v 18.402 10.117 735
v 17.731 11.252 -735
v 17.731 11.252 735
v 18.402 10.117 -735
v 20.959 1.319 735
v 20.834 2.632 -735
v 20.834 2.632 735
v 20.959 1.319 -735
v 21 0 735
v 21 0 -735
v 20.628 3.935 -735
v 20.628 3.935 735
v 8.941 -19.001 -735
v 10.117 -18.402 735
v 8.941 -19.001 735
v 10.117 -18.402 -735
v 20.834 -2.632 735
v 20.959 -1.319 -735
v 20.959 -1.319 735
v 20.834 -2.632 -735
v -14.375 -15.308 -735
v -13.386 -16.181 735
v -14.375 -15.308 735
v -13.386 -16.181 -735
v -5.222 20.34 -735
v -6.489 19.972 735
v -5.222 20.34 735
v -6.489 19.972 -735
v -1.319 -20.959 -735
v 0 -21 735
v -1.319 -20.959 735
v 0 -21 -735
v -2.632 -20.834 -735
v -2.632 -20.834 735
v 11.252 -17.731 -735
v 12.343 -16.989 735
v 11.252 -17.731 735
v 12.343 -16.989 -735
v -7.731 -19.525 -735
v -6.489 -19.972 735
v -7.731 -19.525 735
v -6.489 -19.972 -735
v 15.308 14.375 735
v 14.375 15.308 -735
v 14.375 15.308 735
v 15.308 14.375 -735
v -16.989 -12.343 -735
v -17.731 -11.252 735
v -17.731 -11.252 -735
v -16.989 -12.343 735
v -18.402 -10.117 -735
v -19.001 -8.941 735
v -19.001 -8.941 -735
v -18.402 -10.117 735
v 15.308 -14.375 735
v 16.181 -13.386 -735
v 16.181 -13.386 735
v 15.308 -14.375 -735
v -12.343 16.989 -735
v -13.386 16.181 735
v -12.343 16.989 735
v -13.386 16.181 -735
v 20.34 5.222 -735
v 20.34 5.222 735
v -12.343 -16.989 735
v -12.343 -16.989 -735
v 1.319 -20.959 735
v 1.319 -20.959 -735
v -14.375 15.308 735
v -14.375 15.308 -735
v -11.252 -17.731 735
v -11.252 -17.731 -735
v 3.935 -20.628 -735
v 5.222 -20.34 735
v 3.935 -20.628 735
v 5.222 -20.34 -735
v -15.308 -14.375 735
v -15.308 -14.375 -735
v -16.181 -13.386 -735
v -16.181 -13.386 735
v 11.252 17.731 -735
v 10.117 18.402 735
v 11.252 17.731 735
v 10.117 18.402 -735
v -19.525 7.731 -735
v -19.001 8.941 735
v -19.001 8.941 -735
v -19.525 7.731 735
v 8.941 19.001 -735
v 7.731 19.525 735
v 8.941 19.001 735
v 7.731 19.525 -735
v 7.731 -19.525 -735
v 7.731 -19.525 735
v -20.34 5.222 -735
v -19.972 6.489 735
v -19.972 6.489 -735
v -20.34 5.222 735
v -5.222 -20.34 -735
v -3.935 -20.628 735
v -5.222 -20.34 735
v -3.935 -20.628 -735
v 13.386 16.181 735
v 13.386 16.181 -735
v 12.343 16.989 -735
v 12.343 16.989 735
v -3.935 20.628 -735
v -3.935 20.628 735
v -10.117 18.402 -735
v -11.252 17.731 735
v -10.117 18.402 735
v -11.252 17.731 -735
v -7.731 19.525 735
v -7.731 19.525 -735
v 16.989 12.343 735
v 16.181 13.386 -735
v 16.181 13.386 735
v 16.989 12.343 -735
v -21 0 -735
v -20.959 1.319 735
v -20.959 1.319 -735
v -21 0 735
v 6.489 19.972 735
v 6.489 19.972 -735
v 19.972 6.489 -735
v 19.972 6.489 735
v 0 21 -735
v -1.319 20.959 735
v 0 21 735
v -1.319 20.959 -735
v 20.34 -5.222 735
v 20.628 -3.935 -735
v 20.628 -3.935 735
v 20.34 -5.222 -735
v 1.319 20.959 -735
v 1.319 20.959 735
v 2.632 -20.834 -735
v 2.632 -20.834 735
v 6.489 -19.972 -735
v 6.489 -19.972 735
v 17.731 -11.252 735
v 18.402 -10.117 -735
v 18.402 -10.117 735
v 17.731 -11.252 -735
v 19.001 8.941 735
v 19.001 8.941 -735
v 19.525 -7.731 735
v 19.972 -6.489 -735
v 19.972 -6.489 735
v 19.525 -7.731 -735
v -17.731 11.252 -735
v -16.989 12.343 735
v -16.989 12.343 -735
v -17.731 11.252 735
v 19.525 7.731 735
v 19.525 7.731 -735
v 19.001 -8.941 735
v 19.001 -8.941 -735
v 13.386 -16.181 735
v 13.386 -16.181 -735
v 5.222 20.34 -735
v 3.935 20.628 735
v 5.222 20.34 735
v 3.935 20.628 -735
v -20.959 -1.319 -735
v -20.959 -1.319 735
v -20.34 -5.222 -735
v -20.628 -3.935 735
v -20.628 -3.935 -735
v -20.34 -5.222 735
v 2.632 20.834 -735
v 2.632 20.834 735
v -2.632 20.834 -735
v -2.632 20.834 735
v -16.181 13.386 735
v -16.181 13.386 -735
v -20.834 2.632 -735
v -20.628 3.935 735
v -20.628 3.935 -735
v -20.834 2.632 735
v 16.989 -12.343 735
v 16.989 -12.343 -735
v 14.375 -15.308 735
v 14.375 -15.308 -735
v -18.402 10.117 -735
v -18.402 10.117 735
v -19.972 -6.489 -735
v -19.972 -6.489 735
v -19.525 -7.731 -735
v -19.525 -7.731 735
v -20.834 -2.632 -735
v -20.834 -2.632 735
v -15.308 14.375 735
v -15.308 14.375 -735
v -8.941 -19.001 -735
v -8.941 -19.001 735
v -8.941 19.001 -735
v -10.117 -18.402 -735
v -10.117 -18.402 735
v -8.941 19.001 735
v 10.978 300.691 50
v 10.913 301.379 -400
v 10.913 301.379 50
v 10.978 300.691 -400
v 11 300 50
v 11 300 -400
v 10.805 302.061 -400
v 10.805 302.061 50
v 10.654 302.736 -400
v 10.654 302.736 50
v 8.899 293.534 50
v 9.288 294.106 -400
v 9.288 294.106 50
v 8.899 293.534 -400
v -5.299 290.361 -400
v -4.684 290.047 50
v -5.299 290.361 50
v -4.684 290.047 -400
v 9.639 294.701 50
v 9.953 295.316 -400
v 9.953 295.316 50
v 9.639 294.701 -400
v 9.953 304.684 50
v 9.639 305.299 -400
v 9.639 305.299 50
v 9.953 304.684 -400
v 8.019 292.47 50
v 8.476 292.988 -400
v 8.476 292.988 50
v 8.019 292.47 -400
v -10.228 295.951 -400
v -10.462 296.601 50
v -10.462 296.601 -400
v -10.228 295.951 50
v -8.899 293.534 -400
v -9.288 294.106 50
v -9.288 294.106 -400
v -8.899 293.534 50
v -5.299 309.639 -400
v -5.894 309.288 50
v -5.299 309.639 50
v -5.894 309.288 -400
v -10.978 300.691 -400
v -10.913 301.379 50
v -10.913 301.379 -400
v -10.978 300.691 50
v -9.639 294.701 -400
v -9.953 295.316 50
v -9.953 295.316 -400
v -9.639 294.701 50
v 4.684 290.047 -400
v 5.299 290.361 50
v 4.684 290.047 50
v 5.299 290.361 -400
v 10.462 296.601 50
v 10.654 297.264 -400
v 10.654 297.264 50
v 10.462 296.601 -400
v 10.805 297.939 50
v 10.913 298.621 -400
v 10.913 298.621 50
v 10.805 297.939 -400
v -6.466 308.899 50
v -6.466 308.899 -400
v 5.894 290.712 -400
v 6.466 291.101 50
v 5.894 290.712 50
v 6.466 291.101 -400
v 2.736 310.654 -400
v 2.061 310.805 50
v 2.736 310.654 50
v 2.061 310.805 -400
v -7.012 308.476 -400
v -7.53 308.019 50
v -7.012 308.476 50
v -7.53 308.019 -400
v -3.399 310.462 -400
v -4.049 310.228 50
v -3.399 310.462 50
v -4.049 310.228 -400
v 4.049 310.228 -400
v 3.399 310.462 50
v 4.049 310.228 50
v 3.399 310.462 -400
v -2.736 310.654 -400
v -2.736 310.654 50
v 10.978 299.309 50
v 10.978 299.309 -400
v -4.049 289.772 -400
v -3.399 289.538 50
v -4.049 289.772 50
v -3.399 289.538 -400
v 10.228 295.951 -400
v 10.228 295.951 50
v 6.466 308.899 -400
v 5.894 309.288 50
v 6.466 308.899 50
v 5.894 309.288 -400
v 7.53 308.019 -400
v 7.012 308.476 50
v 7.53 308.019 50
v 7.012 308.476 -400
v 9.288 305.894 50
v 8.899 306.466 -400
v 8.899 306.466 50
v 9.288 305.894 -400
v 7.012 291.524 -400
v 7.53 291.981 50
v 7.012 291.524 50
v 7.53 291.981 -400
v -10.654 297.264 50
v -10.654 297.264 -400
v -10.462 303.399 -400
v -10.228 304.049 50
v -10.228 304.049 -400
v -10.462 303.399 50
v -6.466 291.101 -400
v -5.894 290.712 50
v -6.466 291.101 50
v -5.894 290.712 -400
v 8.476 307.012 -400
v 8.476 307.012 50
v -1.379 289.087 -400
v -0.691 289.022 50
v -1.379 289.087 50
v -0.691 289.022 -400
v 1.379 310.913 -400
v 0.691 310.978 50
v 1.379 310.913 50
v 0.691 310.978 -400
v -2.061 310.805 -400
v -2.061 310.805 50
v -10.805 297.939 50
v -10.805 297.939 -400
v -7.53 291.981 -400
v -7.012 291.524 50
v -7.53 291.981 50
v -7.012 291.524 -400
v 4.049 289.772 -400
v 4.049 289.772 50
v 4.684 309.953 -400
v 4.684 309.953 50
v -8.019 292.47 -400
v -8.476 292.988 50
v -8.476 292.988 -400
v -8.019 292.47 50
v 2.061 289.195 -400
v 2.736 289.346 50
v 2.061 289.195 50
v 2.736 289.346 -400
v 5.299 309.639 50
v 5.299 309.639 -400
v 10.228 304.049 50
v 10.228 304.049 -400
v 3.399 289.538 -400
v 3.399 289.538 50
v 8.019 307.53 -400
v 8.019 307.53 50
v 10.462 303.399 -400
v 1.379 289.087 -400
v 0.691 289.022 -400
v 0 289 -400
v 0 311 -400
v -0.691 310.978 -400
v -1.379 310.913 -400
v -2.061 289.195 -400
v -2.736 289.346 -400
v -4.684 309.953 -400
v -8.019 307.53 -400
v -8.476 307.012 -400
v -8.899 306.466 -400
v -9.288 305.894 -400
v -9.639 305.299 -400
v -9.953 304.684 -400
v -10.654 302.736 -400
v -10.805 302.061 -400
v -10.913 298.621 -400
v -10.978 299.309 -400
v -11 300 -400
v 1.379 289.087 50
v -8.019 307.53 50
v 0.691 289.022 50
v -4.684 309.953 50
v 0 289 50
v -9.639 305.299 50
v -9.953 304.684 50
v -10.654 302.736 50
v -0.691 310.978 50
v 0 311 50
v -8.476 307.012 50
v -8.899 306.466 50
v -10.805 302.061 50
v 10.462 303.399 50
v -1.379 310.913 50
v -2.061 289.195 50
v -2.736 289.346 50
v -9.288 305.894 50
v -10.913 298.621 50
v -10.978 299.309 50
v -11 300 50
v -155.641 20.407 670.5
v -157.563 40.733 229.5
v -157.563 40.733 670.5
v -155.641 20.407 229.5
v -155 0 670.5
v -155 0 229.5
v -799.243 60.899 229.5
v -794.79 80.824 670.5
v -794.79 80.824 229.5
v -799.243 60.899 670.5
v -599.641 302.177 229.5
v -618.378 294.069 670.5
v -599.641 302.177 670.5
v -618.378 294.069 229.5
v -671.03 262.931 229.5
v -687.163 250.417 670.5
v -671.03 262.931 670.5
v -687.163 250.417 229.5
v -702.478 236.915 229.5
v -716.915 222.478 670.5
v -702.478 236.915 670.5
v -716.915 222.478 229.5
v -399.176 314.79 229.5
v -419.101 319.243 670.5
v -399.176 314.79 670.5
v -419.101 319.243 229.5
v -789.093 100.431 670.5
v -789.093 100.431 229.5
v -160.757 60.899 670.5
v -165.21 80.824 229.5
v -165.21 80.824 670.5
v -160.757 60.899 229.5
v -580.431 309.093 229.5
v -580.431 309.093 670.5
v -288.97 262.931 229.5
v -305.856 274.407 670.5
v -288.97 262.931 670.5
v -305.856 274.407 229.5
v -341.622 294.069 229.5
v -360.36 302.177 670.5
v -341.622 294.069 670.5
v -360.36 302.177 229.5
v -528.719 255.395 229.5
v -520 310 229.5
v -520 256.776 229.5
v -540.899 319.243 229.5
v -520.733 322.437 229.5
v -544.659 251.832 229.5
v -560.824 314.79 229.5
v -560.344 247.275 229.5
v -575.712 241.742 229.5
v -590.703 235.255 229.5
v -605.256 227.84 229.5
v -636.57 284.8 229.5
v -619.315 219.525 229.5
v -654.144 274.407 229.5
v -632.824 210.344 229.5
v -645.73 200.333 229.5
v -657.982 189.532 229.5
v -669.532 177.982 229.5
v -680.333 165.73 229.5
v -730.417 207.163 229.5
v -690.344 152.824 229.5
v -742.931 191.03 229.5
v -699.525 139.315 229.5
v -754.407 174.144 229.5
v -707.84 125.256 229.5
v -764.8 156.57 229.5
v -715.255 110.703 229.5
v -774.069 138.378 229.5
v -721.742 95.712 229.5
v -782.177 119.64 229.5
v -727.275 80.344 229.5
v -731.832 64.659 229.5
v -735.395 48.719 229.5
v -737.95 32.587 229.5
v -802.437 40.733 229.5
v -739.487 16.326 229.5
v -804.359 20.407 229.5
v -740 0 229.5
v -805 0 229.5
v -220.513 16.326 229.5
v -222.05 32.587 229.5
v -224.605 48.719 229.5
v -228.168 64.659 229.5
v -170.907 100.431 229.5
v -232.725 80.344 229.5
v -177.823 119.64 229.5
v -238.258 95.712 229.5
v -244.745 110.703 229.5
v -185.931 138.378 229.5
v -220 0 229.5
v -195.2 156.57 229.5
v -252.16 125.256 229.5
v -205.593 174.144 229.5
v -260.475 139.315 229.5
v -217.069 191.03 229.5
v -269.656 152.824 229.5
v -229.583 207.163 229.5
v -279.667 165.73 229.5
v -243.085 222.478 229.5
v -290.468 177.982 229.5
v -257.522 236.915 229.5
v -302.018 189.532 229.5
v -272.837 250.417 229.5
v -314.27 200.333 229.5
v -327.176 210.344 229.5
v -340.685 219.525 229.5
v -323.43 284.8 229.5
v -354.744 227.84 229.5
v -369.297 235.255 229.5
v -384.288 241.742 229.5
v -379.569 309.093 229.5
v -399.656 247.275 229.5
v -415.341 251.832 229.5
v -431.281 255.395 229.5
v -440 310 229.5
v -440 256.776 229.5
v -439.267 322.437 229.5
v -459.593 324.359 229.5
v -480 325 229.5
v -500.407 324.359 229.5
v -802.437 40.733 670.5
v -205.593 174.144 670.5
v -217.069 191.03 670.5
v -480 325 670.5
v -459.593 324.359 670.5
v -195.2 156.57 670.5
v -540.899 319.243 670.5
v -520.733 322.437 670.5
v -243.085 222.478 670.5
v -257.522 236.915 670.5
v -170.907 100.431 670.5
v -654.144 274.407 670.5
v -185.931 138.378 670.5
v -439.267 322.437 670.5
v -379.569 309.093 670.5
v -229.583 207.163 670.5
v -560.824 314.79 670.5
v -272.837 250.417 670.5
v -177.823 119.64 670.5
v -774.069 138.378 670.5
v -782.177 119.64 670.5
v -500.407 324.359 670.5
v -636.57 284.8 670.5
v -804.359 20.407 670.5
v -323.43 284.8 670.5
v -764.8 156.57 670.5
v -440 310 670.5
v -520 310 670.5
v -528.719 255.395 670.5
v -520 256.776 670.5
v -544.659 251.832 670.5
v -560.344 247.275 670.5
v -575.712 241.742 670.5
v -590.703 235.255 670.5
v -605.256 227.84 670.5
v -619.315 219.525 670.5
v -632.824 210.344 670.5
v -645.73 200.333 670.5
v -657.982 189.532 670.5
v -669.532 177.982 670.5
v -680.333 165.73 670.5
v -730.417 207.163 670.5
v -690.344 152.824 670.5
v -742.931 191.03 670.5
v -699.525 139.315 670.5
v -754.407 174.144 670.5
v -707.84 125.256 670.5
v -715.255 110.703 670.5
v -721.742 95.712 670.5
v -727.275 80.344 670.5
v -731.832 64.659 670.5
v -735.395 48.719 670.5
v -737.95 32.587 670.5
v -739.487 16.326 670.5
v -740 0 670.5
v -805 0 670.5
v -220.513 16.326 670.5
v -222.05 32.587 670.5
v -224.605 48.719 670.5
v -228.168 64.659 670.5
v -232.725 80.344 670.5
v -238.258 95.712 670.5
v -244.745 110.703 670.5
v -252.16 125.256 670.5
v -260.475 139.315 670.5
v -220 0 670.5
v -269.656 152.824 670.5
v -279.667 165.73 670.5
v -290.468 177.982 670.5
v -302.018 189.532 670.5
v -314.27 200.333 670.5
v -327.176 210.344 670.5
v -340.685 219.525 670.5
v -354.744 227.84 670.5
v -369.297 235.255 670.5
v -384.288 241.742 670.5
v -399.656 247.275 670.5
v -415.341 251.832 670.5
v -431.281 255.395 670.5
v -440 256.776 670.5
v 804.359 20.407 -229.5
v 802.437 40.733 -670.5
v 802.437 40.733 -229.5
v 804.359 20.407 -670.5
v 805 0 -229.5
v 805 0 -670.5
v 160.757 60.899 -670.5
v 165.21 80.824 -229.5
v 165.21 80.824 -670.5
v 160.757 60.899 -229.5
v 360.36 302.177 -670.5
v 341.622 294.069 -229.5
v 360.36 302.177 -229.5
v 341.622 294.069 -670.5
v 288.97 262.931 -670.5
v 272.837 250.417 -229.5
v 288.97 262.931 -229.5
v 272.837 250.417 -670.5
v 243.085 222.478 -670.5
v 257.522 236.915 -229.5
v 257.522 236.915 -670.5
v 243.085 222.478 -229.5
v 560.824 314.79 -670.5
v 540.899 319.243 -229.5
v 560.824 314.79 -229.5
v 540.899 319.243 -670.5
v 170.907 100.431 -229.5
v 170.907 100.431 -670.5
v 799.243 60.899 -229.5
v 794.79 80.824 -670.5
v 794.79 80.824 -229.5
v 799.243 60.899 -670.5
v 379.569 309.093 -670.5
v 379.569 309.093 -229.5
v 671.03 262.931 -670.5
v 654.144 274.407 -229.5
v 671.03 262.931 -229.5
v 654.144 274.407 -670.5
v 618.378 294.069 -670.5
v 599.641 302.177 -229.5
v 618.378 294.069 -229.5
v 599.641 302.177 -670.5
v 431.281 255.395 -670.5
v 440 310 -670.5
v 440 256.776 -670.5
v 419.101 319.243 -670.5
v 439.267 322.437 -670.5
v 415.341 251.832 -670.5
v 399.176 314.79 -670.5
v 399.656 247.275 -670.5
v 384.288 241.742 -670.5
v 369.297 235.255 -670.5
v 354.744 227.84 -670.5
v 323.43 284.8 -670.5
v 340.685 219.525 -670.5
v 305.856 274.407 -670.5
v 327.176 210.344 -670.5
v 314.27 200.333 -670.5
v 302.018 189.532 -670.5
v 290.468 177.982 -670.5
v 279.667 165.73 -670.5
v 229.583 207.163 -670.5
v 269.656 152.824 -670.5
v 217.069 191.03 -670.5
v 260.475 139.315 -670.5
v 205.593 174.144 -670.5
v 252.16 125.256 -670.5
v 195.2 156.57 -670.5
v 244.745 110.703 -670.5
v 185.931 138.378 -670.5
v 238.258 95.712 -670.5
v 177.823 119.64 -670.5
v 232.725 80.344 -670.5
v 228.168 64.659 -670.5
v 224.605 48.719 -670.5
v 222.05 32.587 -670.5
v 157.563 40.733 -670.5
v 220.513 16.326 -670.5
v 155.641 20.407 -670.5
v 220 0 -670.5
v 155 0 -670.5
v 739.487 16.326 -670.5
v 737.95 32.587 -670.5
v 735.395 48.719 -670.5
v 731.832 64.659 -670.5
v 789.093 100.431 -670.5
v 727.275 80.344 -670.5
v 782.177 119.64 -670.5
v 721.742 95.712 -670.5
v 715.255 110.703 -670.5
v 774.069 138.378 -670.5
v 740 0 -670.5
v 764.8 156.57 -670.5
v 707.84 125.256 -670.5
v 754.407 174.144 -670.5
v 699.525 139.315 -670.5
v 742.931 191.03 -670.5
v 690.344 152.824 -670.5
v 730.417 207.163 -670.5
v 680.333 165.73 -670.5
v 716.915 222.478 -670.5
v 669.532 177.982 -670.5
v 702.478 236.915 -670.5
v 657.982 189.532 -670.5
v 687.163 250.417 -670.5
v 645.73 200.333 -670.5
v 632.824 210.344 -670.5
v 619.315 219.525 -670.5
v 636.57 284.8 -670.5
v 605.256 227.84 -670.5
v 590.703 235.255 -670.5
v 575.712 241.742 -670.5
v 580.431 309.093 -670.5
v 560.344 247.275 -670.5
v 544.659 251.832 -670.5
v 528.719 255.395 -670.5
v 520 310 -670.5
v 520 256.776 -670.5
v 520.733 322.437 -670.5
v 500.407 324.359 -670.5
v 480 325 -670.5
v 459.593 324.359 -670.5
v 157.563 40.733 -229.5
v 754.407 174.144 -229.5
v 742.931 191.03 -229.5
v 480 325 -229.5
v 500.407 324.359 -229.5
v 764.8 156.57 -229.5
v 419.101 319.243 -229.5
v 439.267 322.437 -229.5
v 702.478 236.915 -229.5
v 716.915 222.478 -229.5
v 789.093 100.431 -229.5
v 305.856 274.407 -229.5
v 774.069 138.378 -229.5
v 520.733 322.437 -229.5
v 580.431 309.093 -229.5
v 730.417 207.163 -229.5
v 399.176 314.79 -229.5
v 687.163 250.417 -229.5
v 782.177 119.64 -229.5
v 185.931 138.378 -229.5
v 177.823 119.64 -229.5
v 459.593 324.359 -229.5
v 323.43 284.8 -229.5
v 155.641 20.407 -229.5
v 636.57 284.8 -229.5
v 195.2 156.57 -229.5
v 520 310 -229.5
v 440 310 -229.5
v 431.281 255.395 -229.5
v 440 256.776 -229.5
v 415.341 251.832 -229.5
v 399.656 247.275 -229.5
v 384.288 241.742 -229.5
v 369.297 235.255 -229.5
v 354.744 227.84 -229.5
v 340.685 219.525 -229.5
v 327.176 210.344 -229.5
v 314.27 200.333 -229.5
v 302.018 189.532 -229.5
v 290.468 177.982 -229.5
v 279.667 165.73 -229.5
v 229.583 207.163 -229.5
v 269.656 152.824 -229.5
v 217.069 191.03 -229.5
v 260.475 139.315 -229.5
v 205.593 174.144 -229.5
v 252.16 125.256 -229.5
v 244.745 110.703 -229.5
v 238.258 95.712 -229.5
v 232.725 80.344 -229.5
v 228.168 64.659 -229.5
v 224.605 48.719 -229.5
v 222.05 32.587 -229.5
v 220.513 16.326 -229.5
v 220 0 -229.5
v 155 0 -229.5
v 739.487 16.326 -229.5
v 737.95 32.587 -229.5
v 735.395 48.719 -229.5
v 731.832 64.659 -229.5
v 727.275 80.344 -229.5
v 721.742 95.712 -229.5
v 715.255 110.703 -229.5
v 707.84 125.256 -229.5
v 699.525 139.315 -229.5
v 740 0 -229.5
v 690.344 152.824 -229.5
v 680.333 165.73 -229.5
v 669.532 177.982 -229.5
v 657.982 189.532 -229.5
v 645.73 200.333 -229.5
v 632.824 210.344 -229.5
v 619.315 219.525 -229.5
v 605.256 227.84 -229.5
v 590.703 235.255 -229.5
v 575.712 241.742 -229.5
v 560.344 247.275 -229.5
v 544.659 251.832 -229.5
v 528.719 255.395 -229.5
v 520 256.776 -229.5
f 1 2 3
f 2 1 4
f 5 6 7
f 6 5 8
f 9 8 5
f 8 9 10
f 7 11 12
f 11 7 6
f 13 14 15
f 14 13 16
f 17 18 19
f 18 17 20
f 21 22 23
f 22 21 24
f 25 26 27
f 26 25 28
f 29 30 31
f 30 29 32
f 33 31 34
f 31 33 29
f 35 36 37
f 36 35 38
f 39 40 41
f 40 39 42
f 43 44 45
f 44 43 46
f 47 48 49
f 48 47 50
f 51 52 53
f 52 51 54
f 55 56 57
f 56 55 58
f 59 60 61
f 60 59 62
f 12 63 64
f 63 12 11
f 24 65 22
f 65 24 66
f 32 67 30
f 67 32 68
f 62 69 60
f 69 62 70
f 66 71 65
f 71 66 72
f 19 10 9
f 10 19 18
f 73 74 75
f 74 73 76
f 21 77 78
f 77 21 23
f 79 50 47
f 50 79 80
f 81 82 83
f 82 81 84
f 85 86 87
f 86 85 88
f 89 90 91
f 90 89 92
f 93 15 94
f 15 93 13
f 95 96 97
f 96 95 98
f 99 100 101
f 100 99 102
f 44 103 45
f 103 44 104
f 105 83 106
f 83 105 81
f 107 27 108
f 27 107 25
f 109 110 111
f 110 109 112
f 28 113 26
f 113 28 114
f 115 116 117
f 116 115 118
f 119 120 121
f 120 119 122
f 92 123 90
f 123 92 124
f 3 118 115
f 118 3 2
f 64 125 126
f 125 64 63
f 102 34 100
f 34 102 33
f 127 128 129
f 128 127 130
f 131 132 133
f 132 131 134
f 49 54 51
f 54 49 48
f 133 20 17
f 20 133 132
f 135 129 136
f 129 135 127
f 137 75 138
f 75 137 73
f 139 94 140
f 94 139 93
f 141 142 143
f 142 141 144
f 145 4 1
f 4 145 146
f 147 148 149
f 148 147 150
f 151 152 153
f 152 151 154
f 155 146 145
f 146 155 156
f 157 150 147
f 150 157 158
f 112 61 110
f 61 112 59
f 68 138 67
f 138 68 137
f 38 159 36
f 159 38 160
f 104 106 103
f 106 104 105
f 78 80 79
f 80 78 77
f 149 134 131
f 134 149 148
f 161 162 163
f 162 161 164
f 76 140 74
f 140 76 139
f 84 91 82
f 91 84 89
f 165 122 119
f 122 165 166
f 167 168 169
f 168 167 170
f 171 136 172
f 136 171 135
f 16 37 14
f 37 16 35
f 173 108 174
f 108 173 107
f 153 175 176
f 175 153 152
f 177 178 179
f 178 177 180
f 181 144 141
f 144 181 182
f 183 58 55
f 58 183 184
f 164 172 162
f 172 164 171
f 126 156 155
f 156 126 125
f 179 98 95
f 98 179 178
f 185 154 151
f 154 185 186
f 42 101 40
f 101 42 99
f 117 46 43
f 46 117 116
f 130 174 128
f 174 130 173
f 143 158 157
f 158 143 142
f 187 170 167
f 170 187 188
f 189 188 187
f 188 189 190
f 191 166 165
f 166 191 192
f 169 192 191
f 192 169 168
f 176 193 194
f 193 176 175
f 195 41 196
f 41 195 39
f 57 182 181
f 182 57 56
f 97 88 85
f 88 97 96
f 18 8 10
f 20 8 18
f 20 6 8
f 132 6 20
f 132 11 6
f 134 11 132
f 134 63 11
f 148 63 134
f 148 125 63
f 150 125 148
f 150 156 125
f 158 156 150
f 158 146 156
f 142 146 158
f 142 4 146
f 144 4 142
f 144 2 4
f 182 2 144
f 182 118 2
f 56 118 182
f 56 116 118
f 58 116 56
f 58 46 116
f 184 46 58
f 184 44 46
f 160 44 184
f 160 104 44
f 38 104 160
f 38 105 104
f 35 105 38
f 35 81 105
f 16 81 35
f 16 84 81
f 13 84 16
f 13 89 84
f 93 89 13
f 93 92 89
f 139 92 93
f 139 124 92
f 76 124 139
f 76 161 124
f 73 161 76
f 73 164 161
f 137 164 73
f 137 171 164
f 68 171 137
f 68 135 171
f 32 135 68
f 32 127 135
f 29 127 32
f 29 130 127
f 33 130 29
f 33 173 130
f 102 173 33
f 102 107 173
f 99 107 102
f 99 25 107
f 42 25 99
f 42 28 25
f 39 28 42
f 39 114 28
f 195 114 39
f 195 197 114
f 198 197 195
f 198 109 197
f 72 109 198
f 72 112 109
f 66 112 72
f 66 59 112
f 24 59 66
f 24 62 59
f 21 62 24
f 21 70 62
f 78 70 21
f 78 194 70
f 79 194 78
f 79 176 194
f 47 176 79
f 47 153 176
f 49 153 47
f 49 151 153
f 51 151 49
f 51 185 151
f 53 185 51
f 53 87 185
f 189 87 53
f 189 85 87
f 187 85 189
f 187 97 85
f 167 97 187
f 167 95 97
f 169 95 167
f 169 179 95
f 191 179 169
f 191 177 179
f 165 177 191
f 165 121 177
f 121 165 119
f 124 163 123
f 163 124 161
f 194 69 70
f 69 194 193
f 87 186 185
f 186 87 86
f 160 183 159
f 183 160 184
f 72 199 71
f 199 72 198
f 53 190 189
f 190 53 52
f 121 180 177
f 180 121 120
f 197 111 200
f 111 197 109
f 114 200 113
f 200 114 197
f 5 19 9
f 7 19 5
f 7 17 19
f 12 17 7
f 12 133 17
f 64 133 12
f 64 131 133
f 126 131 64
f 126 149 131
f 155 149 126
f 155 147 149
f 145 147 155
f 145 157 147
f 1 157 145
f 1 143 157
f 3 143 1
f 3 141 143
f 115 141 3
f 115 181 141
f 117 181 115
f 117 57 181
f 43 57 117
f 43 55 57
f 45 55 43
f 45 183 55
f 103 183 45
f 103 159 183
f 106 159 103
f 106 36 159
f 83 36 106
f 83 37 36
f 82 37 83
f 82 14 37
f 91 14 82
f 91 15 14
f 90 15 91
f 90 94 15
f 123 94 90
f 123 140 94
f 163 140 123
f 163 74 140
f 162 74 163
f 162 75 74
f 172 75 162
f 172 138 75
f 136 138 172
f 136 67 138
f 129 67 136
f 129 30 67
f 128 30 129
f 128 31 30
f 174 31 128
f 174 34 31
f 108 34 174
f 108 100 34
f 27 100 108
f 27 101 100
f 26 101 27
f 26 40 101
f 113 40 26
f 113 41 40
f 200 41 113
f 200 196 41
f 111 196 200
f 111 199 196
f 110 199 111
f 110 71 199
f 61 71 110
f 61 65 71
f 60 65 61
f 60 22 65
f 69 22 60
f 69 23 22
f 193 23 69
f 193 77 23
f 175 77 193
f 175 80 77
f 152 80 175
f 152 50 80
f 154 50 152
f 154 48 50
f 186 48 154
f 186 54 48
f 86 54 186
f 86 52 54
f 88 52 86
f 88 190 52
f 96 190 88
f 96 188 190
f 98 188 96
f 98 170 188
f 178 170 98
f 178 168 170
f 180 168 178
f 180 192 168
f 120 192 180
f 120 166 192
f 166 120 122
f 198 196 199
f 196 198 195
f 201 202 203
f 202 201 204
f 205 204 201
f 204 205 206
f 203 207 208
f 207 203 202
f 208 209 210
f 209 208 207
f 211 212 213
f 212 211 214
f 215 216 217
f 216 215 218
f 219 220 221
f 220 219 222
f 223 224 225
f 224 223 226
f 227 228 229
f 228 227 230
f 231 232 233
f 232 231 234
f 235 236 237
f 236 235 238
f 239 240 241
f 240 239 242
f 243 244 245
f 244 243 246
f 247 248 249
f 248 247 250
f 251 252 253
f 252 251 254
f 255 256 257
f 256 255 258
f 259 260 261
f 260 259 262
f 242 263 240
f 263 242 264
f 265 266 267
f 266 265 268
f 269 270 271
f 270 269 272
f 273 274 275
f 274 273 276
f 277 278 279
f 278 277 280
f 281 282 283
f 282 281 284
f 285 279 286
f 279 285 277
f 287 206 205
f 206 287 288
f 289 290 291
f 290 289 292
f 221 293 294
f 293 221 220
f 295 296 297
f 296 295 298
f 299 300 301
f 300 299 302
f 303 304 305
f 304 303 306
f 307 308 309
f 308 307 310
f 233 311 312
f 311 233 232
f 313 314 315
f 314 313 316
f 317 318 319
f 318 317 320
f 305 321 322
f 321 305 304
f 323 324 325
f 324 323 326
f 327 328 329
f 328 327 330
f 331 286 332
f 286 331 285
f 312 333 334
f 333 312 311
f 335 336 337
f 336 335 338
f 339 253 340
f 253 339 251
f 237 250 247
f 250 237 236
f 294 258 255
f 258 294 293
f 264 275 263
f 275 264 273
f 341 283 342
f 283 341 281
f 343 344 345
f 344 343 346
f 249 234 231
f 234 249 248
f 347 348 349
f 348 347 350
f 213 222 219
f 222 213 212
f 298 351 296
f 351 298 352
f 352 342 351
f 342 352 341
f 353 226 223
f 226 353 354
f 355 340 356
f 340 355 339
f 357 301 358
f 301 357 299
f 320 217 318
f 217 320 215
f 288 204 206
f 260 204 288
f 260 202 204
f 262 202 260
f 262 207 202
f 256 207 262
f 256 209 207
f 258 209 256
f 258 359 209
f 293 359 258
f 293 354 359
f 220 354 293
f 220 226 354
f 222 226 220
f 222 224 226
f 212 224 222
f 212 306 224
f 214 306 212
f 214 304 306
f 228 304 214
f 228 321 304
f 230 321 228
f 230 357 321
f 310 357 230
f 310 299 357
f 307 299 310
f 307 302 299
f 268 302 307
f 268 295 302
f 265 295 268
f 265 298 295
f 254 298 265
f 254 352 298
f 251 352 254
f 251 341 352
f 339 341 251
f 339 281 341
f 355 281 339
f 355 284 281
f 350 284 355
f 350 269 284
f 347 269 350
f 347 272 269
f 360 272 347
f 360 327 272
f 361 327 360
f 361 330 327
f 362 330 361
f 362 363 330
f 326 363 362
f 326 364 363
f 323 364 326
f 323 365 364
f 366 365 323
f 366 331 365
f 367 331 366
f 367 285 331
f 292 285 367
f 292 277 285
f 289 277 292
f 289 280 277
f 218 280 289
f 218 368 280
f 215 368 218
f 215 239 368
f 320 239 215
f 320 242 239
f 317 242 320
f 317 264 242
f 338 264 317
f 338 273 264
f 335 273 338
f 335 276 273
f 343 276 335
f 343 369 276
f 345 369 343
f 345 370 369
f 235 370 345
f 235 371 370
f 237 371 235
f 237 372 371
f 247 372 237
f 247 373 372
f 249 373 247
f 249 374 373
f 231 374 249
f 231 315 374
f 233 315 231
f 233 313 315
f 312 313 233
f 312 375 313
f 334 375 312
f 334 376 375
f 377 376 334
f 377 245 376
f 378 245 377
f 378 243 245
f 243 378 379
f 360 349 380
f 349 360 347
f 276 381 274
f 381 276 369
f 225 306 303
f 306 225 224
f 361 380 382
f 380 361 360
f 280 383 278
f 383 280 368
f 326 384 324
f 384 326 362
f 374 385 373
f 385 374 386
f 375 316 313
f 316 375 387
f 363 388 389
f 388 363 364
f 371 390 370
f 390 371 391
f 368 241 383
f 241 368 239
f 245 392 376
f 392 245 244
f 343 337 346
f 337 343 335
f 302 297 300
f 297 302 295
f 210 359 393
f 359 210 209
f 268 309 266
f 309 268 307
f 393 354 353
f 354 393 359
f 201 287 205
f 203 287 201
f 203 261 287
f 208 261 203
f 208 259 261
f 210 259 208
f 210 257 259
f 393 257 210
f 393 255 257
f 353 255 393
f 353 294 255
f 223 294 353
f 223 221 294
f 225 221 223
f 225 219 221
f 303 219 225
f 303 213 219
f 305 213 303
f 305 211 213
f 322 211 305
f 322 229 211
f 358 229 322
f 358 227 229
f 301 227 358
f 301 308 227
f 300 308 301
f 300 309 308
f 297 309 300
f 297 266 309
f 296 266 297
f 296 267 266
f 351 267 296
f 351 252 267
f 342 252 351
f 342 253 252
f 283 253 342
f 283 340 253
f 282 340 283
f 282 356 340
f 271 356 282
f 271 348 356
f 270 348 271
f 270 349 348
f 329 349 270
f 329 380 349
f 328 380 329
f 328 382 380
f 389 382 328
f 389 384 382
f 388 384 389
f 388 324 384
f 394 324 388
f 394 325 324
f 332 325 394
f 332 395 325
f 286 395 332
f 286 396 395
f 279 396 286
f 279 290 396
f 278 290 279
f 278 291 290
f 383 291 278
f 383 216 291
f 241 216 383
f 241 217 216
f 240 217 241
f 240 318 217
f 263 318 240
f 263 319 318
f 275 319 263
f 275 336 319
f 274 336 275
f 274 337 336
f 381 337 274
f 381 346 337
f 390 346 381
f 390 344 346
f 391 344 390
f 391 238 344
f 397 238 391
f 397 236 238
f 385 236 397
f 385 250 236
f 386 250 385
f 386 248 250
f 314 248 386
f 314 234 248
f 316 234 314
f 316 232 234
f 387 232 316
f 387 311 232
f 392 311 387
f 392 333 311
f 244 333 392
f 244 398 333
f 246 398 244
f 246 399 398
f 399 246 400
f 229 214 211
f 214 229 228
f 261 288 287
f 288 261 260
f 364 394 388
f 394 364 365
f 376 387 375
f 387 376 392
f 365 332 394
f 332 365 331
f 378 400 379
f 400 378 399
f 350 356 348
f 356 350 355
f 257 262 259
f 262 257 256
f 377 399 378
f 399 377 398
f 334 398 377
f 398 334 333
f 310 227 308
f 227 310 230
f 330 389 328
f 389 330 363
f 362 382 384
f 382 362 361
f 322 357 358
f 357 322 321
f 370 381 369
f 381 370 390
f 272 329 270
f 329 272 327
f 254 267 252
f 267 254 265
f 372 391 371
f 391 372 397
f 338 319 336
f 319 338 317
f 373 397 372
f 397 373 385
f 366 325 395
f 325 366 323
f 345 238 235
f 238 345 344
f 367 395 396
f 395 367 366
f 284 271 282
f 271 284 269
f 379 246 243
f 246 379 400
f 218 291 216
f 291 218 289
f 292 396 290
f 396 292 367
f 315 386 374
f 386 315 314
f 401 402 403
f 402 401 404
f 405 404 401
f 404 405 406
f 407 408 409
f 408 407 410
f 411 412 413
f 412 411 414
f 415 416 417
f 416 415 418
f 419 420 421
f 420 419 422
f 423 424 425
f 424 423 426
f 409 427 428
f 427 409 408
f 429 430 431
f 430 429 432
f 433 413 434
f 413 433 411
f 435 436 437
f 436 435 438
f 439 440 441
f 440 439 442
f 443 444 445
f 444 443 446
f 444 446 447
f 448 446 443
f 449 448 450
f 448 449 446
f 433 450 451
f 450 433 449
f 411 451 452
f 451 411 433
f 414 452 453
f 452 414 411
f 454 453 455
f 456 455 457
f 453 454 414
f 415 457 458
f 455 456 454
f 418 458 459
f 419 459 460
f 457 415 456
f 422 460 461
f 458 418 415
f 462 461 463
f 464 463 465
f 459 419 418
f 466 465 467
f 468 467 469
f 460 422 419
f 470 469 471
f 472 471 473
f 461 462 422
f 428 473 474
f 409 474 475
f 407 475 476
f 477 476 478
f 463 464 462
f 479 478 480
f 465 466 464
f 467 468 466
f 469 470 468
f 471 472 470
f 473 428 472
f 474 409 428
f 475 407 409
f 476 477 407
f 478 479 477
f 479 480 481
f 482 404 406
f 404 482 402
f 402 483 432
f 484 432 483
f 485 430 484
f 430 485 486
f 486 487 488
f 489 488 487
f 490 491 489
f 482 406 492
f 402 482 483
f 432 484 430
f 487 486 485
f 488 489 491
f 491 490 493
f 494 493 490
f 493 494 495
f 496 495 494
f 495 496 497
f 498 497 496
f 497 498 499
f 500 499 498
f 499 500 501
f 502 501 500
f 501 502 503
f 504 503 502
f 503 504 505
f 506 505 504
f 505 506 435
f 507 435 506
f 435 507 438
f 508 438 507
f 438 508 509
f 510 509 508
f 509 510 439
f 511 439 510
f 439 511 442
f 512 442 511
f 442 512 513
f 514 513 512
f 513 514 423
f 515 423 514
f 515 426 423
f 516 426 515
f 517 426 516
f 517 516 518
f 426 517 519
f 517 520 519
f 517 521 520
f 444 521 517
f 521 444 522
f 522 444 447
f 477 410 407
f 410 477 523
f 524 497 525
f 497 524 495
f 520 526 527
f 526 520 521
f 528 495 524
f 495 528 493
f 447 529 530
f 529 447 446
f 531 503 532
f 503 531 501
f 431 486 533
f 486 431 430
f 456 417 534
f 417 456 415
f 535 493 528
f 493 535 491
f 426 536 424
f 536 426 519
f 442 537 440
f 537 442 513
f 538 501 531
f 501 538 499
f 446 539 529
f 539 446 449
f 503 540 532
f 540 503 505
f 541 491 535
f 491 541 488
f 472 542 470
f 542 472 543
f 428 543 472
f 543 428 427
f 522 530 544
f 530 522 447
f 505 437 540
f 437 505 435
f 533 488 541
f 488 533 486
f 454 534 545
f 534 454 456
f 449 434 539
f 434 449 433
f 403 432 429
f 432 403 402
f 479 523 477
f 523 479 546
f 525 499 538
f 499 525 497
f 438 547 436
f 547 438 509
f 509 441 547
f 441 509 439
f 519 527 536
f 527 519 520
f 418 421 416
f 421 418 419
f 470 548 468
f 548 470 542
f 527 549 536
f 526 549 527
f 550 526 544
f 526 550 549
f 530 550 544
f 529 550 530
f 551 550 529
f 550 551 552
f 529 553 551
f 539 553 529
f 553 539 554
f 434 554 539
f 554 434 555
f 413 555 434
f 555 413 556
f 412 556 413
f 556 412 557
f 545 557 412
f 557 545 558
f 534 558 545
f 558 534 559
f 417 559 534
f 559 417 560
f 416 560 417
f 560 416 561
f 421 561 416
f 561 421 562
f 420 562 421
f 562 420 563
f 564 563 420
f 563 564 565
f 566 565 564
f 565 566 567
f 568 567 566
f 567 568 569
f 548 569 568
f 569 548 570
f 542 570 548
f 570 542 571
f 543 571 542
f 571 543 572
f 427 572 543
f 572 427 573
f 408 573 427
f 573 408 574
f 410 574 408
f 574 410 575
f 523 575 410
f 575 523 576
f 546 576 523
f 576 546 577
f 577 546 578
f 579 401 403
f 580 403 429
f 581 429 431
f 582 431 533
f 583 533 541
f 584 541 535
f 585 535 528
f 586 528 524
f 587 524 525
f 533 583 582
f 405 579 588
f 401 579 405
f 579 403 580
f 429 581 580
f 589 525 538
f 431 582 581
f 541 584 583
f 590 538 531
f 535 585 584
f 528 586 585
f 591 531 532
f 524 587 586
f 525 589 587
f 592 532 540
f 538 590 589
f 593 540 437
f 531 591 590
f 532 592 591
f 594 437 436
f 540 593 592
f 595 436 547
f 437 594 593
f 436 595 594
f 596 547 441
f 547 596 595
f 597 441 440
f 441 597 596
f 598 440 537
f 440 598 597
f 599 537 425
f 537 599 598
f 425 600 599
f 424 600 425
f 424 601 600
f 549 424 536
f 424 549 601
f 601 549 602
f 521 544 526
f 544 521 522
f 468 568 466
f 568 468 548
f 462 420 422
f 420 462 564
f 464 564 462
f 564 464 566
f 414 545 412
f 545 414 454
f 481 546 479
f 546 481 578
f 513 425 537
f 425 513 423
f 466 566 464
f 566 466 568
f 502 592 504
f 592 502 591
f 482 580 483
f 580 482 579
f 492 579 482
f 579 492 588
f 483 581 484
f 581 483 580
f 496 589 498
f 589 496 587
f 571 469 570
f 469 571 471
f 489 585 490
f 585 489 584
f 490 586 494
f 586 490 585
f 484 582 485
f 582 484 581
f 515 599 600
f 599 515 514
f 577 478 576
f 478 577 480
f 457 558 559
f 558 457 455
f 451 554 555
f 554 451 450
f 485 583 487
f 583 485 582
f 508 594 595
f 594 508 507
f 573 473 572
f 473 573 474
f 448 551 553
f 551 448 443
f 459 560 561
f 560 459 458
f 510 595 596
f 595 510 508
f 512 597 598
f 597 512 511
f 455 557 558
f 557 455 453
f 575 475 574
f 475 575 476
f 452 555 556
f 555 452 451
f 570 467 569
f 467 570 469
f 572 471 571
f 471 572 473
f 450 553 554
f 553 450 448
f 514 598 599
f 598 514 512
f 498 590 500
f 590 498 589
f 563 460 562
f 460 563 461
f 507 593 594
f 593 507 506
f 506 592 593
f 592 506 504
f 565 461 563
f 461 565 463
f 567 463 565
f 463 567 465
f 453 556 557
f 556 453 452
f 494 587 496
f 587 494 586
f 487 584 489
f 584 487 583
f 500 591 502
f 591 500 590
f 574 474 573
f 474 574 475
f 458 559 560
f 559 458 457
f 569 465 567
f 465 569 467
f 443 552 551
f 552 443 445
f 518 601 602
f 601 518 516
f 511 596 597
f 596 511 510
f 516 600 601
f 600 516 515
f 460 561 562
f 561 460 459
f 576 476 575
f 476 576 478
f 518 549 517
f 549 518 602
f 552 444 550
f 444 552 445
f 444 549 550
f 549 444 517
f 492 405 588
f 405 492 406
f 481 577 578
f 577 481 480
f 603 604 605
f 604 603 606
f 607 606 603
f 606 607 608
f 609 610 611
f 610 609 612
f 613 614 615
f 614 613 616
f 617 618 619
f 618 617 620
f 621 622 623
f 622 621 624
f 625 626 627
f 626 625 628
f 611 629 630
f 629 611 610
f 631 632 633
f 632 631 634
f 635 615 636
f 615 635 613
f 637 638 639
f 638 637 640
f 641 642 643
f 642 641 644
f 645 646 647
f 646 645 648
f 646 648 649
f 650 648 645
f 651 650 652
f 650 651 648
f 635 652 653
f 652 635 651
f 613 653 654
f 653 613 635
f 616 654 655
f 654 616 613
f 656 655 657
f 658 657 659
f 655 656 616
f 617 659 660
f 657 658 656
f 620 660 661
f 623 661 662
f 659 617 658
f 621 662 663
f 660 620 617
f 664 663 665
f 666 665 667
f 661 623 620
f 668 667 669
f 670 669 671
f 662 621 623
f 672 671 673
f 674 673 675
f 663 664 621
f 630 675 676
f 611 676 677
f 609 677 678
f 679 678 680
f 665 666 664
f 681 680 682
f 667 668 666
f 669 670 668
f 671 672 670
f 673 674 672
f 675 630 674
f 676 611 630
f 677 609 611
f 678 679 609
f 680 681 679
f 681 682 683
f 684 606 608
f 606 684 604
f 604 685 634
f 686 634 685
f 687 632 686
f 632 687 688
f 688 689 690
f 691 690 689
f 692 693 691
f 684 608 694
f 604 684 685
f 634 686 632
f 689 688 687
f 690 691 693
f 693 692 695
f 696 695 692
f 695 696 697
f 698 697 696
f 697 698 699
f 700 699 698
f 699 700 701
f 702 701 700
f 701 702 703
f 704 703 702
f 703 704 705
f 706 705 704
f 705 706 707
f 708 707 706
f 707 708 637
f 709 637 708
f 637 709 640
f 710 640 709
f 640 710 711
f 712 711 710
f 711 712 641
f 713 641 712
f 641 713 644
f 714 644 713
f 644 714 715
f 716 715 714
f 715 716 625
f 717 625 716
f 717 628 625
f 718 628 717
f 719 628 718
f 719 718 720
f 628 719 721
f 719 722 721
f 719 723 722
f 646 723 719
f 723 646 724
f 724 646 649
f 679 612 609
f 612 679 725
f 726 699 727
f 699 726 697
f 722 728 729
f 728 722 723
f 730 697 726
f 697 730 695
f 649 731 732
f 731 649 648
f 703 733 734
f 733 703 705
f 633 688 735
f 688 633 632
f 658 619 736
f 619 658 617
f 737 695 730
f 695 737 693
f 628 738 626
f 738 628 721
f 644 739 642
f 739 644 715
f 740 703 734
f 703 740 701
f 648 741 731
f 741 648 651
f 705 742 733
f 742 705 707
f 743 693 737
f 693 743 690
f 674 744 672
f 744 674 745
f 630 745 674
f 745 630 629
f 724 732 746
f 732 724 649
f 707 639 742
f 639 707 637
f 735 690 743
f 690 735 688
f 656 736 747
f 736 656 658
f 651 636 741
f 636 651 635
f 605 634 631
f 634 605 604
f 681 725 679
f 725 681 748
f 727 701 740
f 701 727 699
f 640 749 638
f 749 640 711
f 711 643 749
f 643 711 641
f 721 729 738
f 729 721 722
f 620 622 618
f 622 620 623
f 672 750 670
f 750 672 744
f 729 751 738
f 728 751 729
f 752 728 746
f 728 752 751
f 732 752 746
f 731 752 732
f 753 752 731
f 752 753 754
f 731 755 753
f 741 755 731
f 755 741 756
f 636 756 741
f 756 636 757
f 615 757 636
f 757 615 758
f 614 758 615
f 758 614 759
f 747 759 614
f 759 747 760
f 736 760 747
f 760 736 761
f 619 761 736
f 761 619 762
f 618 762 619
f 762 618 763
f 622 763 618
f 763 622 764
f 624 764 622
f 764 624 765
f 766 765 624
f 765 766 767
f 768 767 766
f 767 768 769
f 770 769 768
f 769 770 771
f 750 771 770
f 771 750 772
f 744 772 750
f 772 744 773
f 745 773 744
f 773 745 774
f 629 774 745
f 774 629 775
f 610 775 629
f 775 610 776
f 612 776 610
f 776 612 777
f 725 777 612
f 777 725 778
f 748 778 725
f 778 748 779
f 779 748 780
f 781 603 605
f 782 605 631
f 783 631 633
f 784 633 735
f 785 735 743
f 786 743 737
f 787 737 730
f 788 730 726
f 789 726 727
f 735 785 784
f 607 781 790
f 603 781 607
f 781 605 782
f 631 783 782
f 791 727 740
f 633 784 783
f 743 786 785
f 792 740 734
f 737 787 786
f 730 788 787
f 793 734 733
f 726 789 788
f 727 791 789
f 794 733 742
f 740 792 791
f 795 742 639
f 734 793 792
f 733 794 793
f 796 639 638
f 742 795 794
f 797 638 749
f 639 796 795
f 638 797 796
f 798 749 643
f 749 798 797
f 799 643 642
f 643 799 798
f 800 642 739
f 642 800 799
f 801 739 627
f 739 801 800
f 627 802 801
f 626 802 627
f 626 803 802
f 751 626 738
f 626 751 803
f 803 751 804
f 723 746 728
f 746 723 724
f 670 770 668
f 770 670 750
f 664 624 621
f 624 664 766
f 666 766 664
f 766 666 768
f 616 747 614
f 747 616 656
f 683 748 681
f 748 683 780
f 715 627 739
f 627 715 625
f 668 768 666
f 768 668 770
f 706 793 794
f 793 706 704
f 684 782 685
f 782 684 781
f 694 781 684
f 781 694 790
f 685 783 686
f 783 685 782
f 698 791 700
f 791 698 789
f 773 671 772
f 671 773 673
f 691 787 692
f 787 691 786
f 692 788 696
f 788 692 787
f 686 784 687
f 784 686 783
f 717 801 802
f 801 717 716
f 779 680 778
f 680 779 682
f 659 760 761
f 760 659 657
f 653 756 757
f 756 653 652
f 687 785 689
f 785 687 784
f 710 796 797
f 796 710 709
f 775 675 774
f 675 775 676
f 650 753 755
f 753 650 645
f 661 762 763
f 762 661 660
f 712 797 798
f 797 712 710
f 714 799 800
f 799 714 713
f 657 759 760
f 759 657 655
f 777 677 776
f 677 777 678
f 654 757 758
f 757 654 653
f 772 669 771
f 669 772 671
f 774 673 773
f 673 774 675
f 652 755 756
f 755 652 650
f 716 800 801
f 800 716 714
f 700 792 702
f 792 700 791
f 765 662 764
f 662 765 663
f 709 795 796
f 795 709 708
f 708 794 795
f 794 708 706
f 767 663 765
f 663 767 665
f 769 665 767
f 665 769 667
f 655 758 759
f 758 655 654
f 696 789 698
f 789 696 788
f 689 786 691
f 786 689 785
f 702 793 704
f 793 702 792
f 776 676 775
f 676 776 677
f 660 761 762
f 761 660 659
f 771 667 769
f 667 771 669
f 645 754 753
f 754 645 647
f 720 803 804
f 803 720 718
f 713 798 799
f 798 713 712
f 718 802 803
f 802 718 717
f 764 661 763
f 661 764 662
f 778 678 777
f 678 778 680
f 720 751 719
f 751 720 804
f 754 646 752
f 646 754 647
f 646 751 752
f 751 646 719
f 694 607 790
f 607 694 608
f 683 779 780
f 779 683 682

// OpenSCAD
// ============================================================================
// PROJECT: XXXG-00W0 WING GUNDAM ZERO EW - PELVIC CORE INNER BACKBONE INFRA
// COMPONENT VAULT: BANDAI CAST RUNNER G - PELVIC RINGS G15 & G16
// PACKAGING RE-ARCHITECTURE: SUB-ARMOR CAPACITOR RECESSED BANK INTEGRATION
// CONFIG METRIC: SCALED TITANIUM CASTS WITH SWIVEL SLOTS (1:1 ACTUAL METRIC)
// ============================================================================

$fn = 100; // High-precision circular resolution segment count

// Structural Constants Scaled 1:1 for a 16.7-Meter Airframe Scale (mm)
ring_total_length = 980;                 // Total longitudinal vertical depth (mm)
pivot_bore_diameter = 520;               // Core pelvic reduction pin width (mm)
armor_skin_thickness = 65;              // Solid TiAl protective plating wall (mm)
harness_conduit_width = 80;             // Cast-in 4oz copper logic trace track (mm)
capacitor_pocket_depth = 15;            // Sub-armor recessed housing pocket depth (mm)
capacitor_pocket_width = 140;           // Transverse MLCC array pocket width (mm)

module Runner_G_Pelvic_Ring_Forge() {
    // Central Supply Injection Runner Axis (Molten Feed Line from Siphon Forge)
    color([0.22, 0.22, 0.25]) {
        cylinder(h = ring_total_length * 1.5, d = 42, center = true);
        // Direct injection gates tracking straight into the part mold cavities
        translate() rotate() cylinder(h = 350, d = 22);
        translate([0, 300, -400]) rotate() cylinder(h = 450, d = 22);
    }
    
    // Instantiate Scaled Skeutomorphic Part Molds Symmetrically (Left & Right)
    Cast_Internal_Pelvic_Rings();
}

module Cast_Internal_Pelvic_Rings() {
    // ---- PART G15: INTERNAL LEFT STRUCTURAL LOWER PELVIC DRIVE RING CORE ----
    translate([-480, 0, 450]) color([0.35, 0.35, 0.38]) { // Inner Frame Dark Spec
        difference() {
            // Main solid heavy-duty core joint connection block segment
            cylinder(h = ring_total_length * 0.45, d = pivot_bore_diameter + (armor_skin_thickness * 2), center = true);
            
            // Central Concentric Swivel Track Bore (Houses high-load alignment pins)
            cylinder(h = ring_total_length * 0.5, d = pivot_bore_diameter, center = true);
            
            // SUB-ARMOR RECESSED CAPACITOR POCKETS [Segmented rows cut inside the armor inner wall]
            for (z_offset = [-150, 0, 150]) {
                translate([0, (pivot_bore_diameter/2 - armor_skin_thickness + capacitor_pocket_depth/2), z_offset])
                    cube([capacitor_pocket_width, capacitor_pocket_depth, 100], center = true);
            }
            
            // Continuous cast-in routing track for the 4oz solid-state wiring rails
            cube([harness_conduit_width, pivot_bore_diameter + 100, ring_total_length], center = true);
            
            // Slicing profile tool to generate an asymmetrical half-shell part component
            translate([0, -pivot_bore_diameter, 0])
                cube([pivot_bore_diameter * 2, pivot_bore_diameter * 2, ring_total_length * 2], center = true);
        }
    }
    
    // ---- PART G16: INTERNAL RIGHT STRUCTURAL LOWER PELVIC DRIVE RING CORE ----
    translate([480, 0, -450]) rotate() color([0.35, 0.35, 0.38]) {
        difference() {
            cylinder(h = ring_total_length * 0.45, d = pivot_bore_diameter + (armor_skin_thickness * 2), center = true);
            cylinder(h = ring_total_length * 0.5, d = pivot_bore_diameter, center = true);
            
            for (z_offset = [-150, 0, 150]) {
                translate([0, (pivot_bore_diameter/2 - armor_skin_thickness + capacitor_pocket_depth/2), z_offset])
                    cube([capacitor_pocket_width, capacitor_pocket_depth, 100], center = true);
            }
            
            cube([harness_conduit_width, pivot_bore_diameter + 100, ring_total_length], center = true);
            translate([0, -pivot_bore_diameter, 0])
                cube([pivot_bore_diameter * 2, pivot_bore_diameter * 2, ring_total_length * 2], center = true);
        }
    }
}

// Render Master Assembly to Parameter Workspace
Runner_G_Pelvic_Ring_Forge();
